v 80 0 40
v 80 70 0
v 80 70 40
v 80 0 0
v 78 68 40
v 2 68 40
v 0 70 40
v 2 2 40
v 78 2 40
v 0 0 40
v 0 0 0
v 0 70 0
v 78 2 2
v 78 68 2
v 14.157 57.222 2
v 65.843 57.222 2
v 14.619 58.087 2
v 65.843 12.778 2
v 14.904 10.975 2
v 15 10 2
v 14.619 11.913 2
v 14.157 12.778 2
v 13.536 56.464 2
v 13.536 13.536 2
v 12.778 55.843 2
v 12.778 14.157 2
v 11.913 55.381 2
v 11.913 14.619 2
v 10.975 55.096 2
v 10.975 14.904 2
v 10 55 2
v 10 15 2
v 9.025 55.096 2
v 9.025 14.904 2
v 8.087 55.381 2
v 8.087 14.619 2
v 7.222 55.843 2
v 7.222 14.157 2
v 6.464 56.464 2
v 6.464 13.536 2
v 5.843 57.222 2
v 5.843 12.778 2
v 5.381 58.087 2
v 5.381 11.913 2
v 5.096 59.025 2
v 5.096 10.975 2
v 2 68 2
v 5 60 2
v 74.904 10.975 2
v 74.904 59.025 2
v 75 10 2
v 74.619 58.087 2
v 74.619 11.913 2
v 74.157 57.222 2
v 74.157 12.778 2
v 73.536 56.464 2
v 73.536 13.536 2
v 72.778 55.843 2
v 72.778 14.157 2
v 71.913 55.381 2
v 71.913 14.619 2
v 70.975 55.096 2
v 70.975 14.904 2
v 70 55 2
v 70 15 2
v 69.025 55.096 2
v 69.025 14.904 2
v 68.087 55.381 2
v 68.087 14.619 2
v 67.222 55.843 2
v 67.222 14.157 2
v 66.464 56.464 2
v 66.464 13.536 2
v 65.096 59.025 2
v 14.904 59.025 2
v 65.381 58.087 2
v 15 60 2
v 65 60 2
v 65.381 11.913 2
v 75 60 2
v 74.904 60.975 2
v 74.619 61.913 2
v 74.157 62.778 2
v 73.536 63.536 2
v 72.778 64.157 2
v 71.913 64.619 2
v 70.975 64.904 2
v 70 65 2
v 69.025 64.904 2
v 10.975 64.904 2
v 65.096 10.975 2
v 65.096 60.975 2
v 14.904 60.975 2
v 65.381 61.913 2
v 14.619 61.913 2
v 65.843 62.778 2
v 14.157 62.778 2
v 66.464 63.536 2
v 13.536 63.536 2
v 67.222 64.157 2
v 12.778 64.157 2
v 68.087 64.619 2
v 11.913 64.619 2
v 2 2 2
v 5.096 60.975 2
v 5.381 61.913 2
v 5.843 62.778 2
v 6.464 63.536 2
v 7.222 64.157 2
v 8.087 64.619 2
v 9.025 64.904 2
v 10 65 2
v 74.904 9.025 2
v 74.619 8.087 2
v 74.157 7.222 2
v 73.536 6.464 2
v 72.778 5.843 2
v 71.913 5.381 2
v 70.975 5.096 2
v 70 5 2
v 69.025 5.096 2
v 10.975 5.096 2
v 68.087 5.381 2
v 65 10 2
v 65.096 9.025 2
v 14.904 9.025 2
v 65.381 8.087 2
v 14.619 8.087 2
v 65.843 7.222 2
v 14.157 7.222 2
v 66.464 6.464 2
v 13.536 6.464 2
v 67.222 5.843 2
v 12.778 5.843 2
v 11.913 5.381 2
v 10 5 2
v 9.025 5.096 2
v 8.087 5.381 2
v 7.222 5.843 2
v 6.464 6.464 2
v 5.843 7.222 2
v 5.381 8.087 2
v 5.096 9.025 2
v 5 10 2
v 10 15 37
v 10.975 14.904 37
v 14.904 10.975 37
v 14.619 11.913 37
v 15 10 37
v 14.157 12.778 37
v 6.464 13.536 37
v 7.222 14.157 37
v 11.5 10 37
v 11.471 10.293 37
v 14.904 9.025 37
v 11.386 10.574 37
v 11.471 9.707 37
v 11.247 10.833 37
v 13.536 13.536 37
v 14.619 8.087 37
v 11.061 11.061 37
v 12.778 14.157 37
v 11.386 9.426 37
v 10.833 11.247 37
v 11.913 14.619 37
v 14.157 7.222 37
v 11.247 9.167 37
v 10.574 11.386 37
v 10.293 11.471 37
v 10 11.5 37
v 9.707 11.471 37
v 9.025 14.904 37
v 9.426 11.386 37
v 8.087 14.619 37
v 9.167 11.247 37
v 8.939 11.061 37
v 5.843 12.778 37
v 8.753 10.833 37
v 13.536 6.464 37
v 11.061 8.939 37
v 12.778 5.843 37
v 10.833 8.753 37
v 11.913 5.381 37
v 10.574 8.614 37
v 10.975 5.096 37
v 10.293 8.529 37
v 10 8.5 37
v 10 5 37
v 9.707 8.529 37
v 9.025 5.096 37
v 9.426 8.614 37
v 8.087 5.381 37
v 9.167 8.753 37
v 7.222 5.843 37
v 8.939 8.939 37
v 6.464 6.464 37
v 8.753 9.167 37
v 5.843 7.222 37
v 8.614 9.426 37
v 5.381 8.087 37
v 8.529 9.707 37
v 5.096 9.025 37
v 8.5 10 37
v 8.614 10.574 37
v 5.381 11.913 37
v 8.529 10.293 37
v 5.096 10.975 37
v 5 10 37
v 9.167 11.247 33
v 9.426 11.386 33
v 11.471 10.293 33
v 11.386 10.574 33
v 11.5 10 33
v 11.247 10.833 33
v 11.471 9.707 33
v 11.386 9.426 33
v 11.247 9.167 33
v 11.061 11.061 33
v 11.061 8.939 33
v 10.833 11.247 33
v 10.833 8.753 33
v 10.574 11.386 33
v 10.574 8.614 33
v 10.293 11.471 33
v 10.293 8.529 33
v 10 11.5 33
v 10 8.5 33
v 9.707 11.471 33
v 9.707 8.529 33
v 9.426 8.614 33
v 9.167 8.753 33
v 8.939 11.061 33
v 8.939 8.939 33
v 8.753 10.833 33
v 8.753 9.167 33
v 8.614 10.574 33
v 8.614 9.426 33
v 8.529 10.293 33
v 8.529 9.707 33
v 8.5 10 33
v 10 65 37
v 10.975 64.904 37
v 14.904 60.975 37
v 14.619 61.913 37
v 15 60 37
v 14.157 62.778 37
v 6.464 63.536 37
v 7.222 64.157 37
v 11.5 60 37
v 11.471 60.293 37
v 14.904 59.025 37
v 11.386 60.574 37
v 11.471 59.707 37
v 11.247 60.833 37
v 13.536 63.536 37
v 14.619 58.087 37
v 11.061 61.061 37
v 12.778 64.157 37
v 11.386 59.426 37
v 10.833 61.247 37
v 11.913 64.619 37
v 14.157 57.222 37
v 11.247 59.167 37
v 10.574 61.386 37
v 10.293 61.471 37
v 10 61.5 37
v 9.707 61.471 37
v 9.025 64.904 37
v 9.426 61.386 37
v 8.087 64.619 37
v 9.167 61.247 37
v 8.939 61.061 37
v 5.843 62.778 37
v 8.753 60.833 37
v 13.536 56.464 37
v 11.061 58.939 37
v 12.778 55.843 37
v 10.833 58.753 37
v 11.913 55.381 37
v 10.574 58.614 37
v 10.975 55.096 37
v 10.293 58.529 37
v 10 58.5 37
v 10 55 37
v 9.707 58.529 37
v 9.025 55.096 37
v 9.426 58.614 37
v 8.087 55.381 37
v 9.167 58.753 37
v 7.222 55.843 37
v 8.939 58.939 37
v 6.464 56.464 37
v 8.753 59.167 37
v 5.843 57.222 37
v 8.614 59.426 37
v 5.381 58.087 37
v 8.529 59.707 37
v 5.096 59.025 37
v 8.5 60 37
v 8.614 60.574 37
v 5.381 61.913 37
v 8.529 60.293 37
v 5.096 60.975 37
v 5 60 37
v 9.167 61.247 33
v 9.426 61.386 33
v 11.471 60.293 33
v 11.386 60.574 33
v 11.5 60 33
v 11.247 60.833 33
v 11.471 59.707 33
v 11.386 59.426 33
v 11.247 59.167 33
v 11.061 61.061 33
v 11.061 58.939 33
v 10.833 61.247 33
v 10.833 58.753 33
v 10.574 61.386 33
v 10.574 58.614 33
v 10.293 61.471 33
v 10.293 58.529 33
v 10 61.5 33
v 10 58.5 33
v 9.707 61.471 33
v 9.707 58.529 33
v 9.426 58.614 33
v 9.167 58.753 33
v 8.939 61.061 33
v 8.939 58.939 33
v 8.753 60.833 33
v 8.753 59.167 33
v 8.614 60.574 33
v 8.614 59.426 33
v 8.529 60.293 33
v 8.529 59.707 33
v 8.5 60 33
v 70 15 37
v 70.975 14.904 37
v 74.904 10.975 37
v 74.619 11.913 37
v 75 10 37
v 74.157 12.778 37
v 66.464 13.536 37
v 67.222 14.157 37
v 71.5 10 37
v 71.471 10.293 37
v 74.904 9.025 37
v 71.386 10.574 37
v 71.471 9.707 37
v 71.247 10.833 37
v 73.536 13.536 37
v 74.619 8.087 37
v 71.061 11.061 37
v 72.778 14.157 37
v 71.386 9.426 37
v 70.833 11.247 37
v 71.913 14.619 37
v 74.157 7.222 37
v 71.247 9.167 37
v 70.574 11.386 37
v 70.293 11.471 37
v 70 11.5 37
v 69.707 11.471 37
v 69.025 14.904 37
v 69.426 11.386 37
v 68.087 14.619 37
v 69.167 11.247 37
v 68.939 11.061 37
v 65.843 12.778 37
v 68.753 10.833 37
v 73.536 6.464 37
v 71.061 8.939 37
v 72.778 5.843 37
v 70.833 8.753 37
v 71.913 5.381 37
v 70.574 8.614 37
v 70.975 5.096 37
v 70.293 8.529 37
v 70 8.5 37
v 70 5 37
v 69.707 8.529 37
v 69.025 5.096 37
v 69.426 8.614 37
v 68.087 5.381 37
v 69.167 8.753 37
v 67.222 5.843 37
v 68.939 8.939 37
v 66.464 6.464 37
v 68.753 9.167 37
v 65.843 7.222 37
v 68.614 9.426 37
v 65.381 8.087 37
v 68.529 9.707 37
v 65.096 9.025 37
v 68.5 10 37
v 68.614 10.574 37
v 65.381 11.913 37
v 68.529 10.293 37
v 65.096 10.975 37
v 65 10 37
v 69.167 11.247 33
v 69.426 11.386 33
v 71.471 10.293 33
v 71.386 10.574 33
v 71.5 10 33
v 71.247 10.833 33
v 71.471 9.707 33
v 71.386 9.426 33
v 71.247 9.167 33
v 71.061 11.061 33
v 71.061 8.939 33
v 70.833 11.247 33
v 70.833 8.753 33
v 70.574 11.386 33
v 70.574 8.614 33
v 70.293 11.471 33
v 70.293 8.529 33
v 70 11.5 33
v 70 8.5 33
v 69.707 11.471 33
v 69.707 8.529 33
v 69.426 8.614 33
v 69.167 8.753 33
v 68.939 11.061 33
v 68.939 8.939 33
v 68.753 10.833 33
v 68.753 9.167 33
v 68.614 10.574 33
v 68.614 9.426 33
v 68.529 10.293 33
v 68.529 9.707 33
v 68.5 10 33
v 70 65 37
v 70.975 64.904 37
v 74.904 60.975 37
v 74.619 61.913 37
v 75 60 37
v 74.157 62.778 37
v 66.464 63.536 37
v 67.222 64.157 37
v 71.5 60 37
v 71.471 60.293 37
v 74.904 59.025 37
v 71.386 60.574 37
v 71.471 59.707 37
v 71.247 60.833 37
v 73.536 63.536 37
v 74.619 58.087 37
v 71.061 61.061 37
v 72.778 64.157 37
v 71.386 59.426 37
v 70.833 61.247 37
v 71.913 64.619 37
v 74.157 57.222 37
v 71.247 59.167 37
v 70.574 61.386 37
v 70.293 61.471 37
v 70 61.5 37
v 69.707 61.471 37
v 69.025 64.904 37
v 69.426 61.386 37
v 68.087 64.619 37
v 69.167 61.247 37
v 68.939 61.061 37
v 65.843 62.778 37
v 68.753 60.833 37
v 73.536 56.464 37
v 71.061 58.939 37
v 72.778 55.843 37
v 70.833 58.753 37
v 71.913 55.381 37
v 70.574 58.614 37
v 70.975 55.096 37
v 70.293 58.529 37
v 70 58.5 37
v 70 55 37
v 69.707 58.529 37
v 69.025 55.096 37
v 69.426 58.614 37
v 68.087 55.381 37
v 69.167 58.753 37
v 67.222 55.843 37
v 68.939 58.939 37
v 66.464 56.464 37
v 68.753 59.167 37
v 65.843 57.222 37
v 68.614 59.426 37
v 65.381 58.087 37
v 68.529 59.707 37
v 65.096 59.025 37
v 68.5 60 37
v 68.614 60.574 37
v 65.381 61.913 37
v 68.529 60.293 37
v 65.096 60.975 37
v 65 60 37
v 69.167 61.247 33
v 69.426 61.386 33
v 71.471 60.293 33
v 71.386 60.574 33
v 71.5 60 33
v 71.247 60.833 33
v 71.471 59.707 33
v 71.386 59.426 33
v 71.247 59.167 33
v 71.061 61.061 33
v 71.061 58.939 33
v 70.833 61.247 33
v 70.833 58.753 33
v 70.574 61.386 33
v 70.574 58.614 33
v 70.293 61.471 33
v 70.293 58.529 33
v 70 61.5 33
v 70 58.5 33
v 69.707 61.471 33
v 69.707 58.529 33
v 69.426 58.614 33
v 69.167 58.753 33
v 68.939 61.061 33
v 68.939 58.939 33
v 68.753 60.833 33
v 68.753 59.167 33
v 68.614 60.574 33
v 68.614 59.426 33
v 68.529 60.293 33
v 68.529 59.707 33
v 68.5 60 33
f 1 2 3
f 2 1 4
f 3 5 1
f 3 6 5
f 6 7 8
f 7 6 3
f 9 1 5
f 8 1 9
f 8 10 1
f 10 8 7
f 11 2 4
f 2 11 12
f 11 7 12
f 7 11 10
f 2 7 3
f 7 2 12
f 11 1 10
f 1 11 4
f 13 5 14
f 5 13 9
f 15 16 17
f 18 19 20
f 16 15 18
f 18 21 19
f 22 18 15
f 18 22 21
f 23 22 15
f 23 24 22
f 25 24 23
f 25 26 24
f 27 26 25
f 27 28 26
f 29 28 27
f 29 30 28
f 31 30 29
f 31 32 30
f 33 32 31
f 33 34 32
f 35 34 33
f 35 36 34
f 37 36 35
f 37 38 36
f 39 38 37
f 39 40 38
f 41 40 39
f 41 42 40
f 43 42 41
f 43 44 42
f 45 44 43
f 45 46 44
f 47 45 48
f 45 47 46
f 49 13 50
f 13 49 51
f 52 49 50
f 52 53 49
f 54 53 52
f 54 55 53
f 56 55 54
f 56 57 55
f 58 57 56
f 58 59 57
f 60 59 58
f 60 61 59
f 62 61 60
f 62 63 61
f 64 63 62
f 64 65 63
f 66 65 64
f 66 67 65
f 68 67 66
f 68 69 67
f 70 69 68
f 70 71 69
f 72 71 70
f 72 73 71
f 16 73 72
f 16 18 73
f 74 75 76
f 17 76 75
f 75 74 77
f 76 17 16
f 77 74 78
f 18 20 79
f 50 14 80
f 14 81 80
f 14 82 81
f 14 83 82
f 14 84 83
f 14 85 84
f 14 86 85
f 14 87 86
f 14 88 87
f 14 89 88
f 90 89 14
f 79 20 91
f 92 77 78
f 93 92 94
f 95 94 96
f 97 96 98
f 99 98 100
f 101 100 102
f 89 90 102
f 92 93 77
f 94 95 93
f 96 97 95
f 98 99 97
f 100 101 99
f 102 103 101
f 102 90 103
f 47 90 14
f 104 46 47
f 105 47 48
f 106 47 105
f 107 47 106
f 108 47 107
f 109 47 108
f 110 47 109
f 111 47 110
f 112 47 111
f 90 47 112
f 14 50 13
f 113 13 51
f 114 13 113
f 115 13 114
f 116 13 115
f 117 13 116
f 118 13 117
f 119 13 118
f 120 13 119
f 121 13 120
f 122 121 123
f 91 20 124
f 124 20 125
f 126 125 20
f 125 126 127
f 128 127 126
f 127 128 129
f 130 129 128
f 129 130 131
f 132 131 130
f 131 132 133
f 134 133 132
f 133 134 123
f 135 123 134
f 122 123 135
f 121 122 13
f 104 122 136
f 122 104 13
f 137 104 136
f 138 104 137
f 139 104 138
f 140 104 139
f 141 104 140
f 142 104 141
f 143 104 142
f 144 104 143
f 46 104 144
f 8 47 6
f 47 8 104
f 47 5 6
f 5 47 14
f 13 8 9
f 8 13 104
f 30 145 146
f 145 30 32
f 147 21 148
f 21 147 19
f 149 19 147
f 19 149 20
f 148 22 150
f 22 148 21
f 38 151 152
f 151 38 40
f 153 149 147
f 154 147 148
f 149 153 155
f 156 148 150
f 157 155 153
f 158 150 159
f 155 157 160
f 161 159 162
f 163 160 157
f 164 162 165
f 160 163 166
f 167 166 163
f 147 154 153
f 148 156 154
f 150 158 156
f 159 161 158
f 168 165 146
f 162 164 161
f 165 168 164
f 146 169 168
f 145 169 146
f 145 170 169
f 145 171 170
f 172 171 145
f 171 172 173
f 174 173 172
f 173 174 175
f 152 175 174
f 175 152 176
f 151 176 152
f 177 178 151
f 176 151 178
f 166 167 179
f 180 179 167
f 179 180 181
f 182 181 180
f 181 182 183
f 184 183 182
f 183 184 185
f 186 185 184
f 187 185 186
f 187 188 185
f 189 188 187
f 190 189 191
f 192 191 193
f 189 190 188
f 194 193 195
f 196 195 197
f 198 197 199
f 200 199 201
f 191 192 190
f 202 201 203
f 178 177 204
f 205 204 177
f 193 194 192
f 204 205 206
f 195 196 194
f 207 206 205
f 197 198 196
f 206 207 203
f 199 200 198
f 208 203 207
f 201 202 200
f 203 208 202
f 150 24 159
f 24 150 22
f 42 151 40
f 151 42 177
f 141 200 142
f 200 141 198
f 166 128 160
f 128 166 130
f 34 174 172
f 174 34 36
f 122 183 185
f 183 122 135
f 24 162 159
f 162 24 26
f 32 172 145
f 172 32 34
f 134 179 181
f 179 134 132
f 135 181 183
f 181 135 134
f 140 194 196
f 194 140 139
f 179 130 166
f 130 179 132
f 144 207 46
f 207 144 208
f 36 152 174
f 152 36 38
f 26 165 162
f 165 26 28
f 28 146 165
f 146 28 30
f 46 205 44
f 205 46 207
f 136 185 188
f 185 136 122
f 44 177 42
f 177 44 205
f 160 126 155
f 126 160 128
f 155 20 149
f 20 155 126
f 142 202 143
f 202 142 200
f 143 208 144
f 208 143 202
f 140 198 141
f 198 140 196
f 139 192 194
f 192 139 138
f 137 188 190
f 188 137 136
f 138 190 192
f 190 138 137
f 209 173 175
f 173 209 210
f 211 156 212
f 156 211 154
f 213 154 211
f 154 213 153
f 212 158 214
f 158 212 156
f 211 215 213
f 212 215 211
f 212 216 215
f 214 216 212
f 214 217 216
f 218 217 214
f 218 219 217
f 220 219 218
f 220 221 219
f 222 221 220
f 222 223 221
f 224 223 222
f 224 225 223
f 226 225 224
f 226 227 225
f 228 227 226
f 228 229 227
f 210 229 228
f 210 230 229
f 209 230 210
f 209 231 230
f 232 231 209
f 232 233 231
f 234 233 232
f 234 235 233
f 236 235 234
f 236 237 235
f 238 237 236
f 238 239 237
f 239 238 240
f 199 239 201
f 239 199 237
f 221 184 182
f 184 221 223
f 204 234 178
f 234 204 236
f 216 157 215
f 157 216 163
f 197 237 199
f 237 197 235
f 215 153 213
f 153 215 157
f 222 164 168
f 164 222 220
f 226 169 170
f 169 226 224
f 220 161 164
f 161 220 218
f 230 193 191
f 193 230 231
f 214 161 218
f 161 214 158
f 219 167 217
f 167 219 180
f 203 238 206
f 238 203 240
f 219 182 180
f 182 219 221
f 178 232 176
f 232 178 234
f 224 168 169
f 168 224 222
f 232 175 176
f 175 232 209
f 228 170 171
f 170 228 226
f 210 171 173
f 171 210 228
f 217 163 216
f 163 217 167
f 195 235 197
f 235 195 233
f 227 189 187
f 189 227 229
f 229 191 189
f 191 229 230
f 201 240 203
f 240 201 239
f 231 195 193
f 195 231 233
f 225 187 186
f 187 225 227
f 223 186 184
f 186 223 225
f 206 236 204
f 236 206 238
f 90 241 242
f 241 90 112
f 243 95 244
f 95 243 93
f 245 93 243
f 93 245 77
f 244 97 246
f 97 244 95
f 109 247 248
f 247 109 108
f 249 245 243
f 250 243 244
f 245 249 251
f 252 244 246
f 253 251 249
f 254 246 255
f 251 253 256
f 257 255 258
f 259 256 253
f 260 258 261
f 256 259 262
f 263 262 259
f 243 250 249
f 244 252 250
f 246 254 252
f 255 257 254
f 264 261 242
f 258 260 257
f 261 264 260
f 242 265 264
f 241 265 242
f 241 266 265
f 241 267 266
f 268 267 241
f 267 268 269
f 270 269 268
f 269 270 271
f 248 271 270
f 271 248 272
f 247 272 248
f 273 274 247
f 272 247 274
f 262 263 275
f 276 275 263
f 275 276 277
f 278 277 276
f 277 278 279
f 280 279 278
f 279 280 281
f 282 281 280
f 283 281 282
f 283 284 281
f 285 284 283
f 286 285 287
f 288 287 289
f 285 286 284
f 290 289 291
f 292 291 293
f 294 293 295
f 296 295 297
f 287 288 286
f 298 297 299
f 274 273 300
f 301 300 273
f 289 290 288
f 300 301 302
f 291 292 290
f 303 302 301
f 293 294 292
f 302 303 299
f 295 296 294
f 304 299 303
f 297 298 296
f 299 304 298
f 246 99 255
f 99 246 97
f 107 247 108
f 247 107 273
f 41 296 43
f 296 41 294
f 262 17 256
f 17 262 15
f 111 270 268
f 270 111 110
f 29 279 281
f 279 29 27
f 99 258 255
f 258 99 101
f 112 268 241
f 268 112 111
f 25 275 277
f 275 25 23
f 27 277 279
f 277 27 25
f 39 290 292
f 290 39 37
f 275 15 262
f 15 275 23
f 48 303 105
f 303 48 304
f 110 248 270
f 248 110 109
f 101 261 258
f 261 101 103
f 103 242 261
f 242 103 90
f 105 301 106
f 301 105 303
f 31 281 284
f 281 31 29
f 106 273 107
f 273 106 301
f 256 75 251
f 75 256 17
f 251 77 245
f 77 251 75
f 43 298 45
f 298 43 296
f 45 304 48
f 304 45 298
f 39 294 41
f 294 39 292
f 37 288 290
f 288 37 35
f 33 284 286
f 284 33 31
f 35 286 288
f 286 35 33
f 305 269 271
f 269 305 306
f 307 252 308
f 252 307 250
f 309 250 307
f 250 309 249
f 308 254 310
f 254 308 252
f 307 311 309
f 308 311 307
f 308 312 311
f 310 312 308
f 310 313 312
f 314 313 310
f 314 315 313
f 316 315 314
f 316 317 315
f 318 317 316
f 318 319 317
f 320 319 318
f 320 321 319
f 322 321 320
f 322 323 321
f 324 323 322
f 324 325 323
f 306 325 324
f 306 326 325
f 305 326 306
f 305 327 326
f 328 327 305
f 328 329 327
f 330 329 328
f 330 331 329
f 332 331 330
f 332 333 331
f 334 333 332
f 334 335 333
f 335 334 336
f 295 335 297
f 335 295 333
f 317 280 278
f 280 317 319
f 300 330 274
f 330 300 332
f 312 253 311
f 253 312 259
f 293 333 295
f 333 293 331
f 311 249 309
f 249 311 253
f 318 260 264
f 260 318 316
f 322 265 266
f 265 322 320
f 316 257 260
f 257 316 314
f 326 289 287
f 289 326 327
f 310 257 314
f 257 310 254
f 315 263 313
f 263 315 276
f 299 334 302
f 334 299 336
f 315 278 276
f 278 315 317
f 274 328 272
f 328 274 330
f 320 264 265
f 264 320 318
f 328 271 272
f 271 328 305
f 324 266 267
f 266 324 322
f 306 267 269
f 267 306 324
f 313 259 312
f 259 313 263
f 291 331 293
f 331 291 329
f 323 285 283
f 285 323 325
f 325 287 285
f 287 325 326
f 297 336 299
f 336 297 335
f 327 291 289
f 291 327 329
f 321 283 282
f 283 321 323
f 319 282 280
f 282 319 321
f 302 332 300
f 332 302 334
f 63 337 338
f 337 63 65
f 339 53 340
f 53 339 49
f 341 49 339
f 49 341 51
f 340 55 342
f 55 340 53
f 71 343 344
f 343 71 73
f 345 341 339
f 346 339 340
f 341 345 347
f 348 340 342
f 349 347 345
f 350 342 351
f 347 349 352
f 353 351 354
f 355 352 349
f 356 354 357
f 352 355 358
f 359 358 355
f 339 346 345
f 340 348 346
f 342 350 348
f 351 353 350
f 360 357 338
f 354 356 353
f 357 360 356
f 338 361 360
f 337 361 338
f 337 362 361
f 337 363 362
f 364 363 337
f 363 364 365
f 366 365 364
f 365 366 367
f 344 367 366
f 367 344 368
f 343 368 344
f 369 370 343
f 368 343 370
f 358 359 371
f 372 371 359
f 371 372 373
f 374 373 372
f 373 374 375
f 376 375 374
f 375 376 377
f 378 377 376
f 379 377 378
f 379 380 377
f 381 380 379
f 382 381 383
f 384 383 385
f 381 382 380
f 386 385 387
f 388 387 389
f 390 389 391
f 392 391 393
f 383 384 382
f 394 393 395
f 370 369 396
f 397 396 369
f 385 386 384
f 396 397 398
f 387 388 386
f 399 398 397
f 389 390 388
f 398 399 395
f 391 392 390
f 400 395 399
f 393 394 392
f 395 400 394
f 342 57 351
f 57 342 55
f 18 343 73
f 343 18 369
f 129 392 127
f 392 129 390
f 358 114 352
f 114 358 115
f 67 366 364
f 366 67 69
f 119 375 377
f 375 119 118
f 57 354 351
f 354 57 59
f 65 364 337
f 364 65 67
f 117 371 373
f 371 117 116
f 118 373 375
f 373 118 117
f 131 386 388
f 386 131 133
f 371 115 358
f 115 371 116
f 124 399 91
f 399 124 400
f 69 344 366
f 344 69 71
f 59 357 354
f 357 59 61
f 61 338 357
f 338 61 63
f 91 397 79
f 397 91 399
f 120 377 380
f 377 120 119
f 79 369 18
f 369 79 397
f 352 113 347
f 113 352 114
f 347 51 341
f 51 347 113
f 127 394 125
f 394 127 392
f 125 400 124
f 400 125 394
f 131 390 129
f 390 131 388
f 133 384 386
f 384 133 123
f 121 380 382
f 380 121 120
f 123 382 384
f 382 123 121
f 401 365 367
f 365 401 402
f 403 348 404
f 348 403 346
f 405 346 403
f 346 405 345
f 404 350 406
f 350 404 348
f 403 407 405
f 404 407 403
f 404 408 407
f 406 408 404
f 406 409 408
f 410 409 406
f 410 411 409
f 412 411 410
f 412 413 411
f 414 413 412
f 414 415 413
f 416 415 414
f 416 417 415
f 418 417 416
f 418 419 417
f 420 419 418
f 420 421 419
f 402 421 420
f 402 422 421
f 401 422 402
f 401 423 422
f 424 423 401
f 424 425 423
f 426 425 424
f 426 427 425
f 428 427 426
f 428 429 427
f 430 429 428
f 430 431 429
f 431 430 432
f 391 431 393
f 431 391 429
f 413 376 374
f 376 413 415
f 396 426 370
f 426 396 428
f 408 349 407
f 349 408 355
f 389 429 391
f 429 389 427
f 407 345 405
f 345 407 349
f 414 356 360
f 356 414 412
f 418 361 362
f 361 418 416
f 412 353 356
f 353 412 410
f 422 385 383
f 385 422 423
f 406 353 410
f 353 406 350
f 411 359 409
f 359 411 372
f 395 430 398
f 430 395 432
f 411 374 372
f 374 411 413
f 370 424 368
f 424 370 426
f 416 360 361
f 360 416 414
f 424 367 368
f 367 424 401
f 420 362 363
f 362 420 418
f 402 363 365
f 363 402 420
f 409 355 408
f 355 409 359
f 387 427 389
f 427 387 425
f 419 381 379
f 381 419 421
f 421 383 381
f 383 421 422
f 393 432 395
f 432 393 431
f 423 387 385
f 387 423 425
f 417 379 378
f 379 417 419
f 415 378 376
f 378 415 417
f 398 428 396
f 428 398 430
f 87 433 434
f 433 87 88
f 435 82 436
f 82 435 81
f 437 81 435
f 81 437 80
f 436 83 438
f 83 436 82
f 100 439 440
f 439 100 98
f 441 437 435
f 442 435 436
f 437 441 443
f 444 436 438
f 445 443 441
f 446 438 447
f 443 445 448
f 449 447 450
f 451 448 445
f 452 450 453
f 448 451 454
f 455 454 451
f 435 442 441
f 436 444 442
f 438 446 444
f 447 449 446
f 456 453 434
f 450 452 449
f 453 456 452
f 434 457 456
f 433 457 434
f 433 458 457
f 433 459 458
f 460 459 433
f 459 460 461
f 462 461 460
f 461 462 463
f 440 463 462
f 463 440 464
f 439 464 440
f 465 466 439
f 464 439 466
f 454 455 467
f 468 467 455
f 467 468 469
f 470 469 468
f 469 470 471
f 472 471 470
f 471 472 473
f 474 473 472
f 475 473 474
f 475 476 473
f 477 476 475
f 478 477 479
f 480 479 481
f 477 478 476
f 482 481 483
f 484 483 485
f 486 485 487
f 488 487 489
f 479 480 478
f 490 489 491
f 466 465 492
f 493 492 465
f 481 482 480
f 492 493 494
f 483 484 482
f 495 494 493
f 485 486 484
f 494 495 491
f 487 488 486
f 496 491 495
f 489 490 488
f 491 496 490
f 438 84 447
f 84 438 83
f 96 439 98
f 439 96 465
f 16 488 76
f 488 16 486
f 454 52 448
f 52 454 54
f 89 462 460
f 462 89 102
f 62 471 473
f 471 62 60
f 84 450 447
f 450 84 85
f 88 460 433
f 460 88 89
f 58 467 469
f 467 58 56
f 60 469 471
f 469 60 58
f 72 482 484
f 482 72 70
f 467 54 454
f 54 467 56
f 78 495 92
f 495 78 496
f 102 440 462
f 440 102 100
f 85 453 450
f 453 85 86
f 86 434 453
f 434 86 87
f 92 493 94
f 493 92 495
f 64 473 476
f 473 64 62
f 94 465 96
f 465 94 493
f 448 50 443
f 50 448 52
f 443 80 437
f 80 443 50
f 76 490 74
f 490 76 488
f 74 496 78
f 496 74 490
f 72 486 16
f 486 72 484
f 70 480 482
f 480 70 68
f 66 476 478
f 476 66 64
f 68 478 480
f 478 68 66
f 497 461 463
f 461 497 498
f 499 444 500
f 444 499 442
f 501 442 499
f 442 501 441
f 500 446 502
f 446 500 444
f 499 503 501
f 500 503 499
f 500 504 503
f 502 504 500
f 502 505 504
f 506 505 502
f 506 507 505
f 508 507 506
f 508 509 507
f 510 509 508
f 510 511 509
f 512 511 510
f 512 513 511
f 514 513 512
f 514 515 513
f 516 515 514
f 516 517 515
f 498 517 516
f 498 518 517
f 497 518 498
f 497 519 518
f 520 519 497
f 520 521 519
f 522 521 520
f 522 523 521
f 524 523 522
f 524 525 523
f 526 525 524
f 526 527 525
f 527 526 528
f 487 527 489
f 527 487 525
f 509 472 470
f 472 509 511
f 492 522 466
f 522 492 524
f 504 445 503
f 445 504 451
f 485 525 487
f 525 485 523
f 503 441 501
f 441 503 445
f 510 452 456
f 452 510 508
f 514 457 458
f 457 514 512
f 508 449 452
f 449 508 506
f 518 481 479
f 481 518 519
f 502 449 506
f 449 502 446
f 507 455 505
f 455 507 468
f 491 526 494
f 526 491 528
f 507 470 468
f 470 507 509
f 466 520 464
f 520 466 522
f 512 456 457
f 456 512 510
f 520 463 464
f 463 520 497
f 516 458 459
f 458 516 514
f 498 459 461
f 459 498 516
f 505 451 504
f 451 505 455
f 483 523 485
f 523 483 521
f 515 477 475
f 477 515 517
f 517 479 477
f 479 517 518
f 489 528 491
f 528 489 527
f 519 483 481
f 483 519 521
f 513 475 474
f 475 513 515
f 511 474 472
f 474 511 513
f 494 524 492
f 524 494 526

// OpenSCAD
$fn = 32;

// ----------------------------------------------------------------------
// Enclosure box: bosses enclosure
// ----------------------------------------------------------------------

// --- parameters (mm) ---
box_l = 80;               // outer length, X
box_w = 70;               // outer width, Y
box_h = 40;               // outer height
wall_t = 2;               // wall thickness
boss_r = 5;               // corner boss radius
hole_r = 1.5;             // boss screw hole radius
boss_in = 10;             // boss inset from the corners

inner_h = box_h - wall_t;  // cavity depth
boss_h = inner_h - 2;  // corner boss height

difference() {
  union() {
    difference() {
      cube([box_l, box_w, box_h]);
      translate([wall_t, wall_t, wall_t])
        cube([box_l - 2 * wall_t, box_w - 2 * wall_t, box_h]);
    }
    for (sx = [0, 1], sy = [0, 1])
      translate([sx ? box_l - boss_in : boss_in,
                 sy ? box_w - boss_in : boss_in, wall_t - 1])
        difference() {
          cylinder(r = boss_r, h = boss_h);
          translate([0, 0, boss_h - 4])
            cylinder(r = hole_r, h = 5);
        }
  }
}
